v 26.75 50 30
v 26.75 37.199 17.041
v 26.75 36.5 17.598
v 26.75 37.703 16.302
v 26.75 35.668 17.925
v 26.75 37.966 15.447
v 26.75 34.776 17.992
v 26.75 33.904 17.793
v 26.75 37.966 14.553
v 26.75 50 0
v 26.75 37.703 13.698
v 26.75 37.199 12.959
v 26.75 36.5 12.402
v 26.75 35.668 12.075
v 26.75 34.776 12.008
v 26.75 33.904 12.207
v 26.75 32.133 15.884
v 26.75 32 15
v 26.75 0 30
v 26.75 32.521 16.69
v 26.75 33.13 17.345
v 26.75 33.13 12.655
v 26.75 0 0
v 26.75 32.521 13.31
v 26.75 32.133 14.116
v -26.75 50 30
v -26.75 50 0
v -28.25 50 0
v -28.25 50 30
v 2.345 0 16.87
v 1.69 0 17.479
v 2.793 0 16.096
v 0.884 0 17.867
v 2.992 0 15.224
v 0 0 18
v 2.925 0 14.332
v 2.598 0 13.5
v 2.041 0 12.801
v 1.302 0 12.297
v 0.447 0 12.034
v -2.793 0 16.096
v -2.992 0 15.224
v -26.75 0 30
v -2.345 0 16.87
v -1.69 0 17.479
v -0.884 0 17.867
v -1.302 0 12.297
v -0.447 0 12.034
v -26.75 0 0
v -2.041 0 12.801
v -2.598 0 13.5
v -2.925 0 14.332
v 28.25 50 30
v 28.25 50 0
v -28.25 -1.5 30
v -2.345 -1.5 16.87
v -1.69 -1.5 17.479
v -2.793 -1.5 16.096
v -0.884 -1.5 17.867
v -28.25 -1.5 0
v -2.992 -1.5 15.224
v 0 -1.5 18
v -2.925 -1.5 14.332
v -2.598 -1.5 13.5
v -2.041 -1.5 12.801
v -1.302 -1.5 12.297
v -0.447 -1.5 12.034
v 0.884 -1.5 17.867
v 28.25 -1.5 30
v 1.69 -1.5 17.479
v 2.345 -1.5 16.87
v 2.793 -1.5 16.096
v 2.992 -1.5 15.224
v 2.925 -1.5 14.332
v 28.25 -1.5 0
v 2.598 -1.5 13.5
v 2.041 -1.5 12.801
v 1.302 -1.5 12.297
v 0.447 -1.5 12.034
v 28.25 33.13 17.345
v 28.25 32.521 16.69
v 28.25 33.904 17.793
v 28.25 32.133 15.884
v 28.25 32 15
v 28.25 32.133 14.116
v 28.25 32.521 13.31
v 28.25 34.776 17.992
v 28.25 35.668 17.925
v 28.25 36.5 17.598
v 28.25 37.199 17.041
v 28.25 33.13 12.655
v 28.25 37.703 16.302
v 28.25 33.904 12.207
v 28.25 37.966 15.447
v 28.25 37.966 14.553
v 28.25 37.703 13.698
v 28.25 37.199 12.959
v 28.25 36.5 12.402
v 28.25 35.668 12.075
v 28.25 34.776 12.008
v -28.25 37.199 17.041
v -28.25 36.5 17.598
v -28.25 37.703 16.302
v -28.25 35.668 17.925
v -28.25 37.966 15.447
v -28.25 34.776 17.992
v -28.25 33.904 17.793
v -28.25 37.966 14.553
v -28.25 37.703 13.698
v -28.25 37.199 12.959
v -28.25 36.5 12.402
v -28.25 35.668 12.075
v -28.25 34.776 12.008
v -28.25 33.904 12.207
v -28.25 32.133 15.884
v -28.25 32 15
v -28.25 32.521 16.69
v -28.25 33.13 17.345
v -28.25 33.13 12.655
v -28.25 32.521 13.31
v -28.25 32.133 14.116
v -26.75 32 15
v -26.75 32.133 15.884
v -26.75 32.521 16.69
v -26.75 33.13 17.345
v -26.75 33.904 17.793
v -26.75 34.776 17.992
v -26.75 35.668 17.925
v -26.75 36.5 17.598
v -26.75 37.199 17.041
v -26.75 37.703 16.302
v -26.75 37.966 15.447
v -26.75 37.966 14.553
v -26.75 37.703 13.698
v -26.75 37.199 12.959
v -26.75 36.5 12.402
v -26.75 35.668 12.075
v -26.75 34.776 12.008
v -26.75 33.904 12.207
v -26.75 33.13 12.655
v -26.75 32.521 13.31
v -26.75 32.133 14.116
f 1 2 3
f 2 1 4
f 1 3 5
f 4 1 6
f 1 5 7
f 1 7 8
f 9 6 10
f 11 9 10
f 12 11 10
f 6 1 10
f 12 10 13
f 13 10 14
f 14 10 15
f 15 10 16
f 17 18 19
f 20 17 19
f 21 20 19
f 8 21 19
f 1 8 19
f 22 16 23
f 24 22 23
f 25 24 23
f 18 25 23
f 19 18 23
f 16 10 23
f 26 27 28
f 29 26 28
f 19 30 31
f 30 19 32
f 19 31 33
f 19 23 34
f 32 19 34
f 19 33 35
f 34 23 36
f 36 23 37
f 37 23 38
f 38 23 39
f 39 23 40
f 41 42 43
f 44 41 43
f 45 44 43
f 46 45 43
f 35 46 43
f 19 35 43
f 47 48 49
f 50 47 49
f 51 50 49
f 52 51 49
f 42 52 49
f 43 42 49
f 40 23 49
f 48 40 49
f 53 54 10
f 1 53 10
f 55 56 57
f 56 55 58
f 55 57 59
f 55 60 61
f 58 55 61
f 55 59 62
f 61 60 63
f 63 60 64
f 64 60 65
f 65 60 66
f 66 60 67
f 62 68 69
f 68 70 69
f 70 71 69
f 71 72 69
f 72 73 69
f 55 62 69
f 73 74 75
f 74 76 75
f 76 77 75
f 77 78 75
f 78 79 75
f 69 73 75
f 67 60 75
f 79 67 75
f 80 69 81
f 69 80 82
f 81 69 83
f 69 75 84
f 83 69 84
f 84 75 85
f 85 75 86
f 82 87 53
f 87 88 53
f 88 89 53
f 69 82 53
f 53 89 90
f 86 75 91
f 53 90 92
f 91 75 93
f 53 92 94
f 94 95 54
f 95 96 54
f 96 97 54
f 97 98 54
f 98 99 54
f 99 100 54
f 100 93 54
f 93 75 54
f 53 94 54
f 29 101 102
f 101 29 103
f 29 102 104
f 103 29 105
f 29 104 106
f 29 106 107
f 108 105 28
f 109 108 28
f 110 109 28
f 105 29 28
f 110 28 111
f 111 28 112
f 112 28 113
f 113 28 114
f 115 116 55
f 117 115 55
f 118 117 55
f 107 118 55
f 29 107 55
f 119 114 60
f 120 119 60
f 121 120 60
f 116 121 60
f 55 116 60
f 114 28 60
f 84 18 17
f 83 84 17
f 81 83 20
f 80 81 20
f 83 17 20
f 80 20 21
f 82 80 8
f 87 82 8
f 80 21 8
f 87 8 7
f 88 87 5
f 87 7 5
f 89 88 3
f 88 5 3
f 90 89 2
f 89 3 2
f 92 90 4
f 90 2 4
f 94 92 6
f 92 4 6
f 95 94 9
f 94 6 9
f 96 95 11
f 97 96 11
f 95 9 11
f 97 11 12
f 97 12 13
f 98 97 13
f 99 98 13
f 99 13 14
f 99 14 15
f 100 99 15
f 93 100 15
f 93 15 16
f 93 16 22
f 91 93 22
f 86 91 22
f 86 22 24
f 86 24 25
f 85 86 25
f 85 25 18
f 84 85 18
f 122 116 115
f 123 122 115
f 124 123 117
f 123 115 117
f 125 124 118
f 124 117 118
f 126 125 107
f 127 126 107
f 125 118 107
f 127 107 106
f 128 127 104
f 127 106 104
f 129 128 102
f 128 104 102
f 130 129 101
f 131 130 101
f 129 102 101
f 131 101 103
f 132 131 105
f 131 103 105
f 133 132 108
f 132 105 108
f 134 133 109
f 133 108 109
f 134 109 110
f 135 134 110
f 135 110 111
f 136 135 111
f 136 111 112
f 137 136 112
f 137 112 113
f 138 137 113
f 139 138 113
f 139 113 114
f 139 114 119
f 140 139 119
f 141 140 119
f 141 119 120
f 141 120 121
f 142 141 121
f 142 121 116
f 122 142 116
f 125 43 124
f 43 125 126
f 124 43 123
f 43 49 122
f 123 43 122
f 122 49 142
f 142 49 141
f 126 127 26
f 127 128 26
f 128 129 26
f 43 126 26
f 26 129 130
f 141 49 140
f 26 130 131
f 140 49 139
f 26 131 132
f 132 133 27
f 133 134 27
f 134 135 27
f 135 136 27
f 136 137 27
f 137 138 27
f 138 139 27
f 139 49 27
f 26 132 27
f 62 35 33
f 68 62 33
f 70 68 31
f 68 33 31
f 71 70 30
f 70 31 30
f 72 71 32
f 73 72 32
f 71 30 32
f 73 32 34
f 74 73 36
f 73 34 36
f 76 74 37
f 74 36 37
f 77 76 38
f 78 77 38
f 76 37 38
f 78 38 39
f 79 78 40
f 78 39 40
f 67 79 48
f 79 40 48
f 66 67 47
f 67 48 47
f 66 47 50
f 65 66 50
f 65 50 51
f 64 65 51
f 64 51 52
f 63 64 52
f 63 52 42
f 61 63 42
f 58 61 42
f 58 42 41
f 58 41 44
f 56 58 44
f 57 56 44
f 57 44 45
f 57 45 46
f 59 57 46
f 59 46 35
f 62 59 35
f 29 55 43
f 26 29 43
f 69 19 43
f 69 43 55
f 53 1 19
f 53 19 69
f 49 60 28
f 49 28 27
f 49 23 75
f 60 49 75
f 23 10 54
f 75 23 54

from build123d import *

# Parameters (mm, degrees)
BOSS_EXTRUDE1_DEPTH = 30
SKETCH3_R           = 3
CUT_EXTRUDE1_DEPTH  = 60
CUT_EXTRUDE2_REACH  = 66.792
SKETCH4_R           = 3


with BuildPart() as part:
    # Sketch2 → Boss-Extrude1 (new body)
    with BuildSketch(Plane.XY):
        Polygon((26.75, 0), (-26.75, 0), (-26.75, 50), (-28.25, 50), (-28.25, -1.5), (28.25, -1.5), (28.25, 50), (26.75, 50), align=None)
    extrude(amount=BOSS_EXTRUDE1_DEPTH)

    # Sketch3 → Cut-Extrude1 (cut)
    with BuildSketch(Plane.ZY.offset(28.25)):
        with Locations(Location((15, 35, 0), (0, 0, 270))):
            Circle(SKETCH3_R)
    extrude(amount=-CUT_EXTRUDE1_DEPTH, mode=Mode.SUBTRACT)

    # Sketch4 → Cut-Extrude2 (cut, up to next)
    with BuildSketch(Plane(origin=(0, 0, 0), x_dir=(1, 0, 0), z_dir=(0, 1, 0)), mode=Mode.PRIVATE) as cut_extrude2_sk1:
        with Locations(Location((0, -15, 0), (0, 0, 270))):
            Circle(SKETCH4_R)
    cut_extrude2_tool1 = extrude(cut_extrude2_sk1.sketch, amount=-CUT_EXTRUDE2_REACH, mode=Mode.PRIVATE) & part.part
    add(cut_extrude2_tool1.solids().sort_by_distance((0, 0, 15))[0], mode=Mode.SUBTRACT)


solid = part.part
